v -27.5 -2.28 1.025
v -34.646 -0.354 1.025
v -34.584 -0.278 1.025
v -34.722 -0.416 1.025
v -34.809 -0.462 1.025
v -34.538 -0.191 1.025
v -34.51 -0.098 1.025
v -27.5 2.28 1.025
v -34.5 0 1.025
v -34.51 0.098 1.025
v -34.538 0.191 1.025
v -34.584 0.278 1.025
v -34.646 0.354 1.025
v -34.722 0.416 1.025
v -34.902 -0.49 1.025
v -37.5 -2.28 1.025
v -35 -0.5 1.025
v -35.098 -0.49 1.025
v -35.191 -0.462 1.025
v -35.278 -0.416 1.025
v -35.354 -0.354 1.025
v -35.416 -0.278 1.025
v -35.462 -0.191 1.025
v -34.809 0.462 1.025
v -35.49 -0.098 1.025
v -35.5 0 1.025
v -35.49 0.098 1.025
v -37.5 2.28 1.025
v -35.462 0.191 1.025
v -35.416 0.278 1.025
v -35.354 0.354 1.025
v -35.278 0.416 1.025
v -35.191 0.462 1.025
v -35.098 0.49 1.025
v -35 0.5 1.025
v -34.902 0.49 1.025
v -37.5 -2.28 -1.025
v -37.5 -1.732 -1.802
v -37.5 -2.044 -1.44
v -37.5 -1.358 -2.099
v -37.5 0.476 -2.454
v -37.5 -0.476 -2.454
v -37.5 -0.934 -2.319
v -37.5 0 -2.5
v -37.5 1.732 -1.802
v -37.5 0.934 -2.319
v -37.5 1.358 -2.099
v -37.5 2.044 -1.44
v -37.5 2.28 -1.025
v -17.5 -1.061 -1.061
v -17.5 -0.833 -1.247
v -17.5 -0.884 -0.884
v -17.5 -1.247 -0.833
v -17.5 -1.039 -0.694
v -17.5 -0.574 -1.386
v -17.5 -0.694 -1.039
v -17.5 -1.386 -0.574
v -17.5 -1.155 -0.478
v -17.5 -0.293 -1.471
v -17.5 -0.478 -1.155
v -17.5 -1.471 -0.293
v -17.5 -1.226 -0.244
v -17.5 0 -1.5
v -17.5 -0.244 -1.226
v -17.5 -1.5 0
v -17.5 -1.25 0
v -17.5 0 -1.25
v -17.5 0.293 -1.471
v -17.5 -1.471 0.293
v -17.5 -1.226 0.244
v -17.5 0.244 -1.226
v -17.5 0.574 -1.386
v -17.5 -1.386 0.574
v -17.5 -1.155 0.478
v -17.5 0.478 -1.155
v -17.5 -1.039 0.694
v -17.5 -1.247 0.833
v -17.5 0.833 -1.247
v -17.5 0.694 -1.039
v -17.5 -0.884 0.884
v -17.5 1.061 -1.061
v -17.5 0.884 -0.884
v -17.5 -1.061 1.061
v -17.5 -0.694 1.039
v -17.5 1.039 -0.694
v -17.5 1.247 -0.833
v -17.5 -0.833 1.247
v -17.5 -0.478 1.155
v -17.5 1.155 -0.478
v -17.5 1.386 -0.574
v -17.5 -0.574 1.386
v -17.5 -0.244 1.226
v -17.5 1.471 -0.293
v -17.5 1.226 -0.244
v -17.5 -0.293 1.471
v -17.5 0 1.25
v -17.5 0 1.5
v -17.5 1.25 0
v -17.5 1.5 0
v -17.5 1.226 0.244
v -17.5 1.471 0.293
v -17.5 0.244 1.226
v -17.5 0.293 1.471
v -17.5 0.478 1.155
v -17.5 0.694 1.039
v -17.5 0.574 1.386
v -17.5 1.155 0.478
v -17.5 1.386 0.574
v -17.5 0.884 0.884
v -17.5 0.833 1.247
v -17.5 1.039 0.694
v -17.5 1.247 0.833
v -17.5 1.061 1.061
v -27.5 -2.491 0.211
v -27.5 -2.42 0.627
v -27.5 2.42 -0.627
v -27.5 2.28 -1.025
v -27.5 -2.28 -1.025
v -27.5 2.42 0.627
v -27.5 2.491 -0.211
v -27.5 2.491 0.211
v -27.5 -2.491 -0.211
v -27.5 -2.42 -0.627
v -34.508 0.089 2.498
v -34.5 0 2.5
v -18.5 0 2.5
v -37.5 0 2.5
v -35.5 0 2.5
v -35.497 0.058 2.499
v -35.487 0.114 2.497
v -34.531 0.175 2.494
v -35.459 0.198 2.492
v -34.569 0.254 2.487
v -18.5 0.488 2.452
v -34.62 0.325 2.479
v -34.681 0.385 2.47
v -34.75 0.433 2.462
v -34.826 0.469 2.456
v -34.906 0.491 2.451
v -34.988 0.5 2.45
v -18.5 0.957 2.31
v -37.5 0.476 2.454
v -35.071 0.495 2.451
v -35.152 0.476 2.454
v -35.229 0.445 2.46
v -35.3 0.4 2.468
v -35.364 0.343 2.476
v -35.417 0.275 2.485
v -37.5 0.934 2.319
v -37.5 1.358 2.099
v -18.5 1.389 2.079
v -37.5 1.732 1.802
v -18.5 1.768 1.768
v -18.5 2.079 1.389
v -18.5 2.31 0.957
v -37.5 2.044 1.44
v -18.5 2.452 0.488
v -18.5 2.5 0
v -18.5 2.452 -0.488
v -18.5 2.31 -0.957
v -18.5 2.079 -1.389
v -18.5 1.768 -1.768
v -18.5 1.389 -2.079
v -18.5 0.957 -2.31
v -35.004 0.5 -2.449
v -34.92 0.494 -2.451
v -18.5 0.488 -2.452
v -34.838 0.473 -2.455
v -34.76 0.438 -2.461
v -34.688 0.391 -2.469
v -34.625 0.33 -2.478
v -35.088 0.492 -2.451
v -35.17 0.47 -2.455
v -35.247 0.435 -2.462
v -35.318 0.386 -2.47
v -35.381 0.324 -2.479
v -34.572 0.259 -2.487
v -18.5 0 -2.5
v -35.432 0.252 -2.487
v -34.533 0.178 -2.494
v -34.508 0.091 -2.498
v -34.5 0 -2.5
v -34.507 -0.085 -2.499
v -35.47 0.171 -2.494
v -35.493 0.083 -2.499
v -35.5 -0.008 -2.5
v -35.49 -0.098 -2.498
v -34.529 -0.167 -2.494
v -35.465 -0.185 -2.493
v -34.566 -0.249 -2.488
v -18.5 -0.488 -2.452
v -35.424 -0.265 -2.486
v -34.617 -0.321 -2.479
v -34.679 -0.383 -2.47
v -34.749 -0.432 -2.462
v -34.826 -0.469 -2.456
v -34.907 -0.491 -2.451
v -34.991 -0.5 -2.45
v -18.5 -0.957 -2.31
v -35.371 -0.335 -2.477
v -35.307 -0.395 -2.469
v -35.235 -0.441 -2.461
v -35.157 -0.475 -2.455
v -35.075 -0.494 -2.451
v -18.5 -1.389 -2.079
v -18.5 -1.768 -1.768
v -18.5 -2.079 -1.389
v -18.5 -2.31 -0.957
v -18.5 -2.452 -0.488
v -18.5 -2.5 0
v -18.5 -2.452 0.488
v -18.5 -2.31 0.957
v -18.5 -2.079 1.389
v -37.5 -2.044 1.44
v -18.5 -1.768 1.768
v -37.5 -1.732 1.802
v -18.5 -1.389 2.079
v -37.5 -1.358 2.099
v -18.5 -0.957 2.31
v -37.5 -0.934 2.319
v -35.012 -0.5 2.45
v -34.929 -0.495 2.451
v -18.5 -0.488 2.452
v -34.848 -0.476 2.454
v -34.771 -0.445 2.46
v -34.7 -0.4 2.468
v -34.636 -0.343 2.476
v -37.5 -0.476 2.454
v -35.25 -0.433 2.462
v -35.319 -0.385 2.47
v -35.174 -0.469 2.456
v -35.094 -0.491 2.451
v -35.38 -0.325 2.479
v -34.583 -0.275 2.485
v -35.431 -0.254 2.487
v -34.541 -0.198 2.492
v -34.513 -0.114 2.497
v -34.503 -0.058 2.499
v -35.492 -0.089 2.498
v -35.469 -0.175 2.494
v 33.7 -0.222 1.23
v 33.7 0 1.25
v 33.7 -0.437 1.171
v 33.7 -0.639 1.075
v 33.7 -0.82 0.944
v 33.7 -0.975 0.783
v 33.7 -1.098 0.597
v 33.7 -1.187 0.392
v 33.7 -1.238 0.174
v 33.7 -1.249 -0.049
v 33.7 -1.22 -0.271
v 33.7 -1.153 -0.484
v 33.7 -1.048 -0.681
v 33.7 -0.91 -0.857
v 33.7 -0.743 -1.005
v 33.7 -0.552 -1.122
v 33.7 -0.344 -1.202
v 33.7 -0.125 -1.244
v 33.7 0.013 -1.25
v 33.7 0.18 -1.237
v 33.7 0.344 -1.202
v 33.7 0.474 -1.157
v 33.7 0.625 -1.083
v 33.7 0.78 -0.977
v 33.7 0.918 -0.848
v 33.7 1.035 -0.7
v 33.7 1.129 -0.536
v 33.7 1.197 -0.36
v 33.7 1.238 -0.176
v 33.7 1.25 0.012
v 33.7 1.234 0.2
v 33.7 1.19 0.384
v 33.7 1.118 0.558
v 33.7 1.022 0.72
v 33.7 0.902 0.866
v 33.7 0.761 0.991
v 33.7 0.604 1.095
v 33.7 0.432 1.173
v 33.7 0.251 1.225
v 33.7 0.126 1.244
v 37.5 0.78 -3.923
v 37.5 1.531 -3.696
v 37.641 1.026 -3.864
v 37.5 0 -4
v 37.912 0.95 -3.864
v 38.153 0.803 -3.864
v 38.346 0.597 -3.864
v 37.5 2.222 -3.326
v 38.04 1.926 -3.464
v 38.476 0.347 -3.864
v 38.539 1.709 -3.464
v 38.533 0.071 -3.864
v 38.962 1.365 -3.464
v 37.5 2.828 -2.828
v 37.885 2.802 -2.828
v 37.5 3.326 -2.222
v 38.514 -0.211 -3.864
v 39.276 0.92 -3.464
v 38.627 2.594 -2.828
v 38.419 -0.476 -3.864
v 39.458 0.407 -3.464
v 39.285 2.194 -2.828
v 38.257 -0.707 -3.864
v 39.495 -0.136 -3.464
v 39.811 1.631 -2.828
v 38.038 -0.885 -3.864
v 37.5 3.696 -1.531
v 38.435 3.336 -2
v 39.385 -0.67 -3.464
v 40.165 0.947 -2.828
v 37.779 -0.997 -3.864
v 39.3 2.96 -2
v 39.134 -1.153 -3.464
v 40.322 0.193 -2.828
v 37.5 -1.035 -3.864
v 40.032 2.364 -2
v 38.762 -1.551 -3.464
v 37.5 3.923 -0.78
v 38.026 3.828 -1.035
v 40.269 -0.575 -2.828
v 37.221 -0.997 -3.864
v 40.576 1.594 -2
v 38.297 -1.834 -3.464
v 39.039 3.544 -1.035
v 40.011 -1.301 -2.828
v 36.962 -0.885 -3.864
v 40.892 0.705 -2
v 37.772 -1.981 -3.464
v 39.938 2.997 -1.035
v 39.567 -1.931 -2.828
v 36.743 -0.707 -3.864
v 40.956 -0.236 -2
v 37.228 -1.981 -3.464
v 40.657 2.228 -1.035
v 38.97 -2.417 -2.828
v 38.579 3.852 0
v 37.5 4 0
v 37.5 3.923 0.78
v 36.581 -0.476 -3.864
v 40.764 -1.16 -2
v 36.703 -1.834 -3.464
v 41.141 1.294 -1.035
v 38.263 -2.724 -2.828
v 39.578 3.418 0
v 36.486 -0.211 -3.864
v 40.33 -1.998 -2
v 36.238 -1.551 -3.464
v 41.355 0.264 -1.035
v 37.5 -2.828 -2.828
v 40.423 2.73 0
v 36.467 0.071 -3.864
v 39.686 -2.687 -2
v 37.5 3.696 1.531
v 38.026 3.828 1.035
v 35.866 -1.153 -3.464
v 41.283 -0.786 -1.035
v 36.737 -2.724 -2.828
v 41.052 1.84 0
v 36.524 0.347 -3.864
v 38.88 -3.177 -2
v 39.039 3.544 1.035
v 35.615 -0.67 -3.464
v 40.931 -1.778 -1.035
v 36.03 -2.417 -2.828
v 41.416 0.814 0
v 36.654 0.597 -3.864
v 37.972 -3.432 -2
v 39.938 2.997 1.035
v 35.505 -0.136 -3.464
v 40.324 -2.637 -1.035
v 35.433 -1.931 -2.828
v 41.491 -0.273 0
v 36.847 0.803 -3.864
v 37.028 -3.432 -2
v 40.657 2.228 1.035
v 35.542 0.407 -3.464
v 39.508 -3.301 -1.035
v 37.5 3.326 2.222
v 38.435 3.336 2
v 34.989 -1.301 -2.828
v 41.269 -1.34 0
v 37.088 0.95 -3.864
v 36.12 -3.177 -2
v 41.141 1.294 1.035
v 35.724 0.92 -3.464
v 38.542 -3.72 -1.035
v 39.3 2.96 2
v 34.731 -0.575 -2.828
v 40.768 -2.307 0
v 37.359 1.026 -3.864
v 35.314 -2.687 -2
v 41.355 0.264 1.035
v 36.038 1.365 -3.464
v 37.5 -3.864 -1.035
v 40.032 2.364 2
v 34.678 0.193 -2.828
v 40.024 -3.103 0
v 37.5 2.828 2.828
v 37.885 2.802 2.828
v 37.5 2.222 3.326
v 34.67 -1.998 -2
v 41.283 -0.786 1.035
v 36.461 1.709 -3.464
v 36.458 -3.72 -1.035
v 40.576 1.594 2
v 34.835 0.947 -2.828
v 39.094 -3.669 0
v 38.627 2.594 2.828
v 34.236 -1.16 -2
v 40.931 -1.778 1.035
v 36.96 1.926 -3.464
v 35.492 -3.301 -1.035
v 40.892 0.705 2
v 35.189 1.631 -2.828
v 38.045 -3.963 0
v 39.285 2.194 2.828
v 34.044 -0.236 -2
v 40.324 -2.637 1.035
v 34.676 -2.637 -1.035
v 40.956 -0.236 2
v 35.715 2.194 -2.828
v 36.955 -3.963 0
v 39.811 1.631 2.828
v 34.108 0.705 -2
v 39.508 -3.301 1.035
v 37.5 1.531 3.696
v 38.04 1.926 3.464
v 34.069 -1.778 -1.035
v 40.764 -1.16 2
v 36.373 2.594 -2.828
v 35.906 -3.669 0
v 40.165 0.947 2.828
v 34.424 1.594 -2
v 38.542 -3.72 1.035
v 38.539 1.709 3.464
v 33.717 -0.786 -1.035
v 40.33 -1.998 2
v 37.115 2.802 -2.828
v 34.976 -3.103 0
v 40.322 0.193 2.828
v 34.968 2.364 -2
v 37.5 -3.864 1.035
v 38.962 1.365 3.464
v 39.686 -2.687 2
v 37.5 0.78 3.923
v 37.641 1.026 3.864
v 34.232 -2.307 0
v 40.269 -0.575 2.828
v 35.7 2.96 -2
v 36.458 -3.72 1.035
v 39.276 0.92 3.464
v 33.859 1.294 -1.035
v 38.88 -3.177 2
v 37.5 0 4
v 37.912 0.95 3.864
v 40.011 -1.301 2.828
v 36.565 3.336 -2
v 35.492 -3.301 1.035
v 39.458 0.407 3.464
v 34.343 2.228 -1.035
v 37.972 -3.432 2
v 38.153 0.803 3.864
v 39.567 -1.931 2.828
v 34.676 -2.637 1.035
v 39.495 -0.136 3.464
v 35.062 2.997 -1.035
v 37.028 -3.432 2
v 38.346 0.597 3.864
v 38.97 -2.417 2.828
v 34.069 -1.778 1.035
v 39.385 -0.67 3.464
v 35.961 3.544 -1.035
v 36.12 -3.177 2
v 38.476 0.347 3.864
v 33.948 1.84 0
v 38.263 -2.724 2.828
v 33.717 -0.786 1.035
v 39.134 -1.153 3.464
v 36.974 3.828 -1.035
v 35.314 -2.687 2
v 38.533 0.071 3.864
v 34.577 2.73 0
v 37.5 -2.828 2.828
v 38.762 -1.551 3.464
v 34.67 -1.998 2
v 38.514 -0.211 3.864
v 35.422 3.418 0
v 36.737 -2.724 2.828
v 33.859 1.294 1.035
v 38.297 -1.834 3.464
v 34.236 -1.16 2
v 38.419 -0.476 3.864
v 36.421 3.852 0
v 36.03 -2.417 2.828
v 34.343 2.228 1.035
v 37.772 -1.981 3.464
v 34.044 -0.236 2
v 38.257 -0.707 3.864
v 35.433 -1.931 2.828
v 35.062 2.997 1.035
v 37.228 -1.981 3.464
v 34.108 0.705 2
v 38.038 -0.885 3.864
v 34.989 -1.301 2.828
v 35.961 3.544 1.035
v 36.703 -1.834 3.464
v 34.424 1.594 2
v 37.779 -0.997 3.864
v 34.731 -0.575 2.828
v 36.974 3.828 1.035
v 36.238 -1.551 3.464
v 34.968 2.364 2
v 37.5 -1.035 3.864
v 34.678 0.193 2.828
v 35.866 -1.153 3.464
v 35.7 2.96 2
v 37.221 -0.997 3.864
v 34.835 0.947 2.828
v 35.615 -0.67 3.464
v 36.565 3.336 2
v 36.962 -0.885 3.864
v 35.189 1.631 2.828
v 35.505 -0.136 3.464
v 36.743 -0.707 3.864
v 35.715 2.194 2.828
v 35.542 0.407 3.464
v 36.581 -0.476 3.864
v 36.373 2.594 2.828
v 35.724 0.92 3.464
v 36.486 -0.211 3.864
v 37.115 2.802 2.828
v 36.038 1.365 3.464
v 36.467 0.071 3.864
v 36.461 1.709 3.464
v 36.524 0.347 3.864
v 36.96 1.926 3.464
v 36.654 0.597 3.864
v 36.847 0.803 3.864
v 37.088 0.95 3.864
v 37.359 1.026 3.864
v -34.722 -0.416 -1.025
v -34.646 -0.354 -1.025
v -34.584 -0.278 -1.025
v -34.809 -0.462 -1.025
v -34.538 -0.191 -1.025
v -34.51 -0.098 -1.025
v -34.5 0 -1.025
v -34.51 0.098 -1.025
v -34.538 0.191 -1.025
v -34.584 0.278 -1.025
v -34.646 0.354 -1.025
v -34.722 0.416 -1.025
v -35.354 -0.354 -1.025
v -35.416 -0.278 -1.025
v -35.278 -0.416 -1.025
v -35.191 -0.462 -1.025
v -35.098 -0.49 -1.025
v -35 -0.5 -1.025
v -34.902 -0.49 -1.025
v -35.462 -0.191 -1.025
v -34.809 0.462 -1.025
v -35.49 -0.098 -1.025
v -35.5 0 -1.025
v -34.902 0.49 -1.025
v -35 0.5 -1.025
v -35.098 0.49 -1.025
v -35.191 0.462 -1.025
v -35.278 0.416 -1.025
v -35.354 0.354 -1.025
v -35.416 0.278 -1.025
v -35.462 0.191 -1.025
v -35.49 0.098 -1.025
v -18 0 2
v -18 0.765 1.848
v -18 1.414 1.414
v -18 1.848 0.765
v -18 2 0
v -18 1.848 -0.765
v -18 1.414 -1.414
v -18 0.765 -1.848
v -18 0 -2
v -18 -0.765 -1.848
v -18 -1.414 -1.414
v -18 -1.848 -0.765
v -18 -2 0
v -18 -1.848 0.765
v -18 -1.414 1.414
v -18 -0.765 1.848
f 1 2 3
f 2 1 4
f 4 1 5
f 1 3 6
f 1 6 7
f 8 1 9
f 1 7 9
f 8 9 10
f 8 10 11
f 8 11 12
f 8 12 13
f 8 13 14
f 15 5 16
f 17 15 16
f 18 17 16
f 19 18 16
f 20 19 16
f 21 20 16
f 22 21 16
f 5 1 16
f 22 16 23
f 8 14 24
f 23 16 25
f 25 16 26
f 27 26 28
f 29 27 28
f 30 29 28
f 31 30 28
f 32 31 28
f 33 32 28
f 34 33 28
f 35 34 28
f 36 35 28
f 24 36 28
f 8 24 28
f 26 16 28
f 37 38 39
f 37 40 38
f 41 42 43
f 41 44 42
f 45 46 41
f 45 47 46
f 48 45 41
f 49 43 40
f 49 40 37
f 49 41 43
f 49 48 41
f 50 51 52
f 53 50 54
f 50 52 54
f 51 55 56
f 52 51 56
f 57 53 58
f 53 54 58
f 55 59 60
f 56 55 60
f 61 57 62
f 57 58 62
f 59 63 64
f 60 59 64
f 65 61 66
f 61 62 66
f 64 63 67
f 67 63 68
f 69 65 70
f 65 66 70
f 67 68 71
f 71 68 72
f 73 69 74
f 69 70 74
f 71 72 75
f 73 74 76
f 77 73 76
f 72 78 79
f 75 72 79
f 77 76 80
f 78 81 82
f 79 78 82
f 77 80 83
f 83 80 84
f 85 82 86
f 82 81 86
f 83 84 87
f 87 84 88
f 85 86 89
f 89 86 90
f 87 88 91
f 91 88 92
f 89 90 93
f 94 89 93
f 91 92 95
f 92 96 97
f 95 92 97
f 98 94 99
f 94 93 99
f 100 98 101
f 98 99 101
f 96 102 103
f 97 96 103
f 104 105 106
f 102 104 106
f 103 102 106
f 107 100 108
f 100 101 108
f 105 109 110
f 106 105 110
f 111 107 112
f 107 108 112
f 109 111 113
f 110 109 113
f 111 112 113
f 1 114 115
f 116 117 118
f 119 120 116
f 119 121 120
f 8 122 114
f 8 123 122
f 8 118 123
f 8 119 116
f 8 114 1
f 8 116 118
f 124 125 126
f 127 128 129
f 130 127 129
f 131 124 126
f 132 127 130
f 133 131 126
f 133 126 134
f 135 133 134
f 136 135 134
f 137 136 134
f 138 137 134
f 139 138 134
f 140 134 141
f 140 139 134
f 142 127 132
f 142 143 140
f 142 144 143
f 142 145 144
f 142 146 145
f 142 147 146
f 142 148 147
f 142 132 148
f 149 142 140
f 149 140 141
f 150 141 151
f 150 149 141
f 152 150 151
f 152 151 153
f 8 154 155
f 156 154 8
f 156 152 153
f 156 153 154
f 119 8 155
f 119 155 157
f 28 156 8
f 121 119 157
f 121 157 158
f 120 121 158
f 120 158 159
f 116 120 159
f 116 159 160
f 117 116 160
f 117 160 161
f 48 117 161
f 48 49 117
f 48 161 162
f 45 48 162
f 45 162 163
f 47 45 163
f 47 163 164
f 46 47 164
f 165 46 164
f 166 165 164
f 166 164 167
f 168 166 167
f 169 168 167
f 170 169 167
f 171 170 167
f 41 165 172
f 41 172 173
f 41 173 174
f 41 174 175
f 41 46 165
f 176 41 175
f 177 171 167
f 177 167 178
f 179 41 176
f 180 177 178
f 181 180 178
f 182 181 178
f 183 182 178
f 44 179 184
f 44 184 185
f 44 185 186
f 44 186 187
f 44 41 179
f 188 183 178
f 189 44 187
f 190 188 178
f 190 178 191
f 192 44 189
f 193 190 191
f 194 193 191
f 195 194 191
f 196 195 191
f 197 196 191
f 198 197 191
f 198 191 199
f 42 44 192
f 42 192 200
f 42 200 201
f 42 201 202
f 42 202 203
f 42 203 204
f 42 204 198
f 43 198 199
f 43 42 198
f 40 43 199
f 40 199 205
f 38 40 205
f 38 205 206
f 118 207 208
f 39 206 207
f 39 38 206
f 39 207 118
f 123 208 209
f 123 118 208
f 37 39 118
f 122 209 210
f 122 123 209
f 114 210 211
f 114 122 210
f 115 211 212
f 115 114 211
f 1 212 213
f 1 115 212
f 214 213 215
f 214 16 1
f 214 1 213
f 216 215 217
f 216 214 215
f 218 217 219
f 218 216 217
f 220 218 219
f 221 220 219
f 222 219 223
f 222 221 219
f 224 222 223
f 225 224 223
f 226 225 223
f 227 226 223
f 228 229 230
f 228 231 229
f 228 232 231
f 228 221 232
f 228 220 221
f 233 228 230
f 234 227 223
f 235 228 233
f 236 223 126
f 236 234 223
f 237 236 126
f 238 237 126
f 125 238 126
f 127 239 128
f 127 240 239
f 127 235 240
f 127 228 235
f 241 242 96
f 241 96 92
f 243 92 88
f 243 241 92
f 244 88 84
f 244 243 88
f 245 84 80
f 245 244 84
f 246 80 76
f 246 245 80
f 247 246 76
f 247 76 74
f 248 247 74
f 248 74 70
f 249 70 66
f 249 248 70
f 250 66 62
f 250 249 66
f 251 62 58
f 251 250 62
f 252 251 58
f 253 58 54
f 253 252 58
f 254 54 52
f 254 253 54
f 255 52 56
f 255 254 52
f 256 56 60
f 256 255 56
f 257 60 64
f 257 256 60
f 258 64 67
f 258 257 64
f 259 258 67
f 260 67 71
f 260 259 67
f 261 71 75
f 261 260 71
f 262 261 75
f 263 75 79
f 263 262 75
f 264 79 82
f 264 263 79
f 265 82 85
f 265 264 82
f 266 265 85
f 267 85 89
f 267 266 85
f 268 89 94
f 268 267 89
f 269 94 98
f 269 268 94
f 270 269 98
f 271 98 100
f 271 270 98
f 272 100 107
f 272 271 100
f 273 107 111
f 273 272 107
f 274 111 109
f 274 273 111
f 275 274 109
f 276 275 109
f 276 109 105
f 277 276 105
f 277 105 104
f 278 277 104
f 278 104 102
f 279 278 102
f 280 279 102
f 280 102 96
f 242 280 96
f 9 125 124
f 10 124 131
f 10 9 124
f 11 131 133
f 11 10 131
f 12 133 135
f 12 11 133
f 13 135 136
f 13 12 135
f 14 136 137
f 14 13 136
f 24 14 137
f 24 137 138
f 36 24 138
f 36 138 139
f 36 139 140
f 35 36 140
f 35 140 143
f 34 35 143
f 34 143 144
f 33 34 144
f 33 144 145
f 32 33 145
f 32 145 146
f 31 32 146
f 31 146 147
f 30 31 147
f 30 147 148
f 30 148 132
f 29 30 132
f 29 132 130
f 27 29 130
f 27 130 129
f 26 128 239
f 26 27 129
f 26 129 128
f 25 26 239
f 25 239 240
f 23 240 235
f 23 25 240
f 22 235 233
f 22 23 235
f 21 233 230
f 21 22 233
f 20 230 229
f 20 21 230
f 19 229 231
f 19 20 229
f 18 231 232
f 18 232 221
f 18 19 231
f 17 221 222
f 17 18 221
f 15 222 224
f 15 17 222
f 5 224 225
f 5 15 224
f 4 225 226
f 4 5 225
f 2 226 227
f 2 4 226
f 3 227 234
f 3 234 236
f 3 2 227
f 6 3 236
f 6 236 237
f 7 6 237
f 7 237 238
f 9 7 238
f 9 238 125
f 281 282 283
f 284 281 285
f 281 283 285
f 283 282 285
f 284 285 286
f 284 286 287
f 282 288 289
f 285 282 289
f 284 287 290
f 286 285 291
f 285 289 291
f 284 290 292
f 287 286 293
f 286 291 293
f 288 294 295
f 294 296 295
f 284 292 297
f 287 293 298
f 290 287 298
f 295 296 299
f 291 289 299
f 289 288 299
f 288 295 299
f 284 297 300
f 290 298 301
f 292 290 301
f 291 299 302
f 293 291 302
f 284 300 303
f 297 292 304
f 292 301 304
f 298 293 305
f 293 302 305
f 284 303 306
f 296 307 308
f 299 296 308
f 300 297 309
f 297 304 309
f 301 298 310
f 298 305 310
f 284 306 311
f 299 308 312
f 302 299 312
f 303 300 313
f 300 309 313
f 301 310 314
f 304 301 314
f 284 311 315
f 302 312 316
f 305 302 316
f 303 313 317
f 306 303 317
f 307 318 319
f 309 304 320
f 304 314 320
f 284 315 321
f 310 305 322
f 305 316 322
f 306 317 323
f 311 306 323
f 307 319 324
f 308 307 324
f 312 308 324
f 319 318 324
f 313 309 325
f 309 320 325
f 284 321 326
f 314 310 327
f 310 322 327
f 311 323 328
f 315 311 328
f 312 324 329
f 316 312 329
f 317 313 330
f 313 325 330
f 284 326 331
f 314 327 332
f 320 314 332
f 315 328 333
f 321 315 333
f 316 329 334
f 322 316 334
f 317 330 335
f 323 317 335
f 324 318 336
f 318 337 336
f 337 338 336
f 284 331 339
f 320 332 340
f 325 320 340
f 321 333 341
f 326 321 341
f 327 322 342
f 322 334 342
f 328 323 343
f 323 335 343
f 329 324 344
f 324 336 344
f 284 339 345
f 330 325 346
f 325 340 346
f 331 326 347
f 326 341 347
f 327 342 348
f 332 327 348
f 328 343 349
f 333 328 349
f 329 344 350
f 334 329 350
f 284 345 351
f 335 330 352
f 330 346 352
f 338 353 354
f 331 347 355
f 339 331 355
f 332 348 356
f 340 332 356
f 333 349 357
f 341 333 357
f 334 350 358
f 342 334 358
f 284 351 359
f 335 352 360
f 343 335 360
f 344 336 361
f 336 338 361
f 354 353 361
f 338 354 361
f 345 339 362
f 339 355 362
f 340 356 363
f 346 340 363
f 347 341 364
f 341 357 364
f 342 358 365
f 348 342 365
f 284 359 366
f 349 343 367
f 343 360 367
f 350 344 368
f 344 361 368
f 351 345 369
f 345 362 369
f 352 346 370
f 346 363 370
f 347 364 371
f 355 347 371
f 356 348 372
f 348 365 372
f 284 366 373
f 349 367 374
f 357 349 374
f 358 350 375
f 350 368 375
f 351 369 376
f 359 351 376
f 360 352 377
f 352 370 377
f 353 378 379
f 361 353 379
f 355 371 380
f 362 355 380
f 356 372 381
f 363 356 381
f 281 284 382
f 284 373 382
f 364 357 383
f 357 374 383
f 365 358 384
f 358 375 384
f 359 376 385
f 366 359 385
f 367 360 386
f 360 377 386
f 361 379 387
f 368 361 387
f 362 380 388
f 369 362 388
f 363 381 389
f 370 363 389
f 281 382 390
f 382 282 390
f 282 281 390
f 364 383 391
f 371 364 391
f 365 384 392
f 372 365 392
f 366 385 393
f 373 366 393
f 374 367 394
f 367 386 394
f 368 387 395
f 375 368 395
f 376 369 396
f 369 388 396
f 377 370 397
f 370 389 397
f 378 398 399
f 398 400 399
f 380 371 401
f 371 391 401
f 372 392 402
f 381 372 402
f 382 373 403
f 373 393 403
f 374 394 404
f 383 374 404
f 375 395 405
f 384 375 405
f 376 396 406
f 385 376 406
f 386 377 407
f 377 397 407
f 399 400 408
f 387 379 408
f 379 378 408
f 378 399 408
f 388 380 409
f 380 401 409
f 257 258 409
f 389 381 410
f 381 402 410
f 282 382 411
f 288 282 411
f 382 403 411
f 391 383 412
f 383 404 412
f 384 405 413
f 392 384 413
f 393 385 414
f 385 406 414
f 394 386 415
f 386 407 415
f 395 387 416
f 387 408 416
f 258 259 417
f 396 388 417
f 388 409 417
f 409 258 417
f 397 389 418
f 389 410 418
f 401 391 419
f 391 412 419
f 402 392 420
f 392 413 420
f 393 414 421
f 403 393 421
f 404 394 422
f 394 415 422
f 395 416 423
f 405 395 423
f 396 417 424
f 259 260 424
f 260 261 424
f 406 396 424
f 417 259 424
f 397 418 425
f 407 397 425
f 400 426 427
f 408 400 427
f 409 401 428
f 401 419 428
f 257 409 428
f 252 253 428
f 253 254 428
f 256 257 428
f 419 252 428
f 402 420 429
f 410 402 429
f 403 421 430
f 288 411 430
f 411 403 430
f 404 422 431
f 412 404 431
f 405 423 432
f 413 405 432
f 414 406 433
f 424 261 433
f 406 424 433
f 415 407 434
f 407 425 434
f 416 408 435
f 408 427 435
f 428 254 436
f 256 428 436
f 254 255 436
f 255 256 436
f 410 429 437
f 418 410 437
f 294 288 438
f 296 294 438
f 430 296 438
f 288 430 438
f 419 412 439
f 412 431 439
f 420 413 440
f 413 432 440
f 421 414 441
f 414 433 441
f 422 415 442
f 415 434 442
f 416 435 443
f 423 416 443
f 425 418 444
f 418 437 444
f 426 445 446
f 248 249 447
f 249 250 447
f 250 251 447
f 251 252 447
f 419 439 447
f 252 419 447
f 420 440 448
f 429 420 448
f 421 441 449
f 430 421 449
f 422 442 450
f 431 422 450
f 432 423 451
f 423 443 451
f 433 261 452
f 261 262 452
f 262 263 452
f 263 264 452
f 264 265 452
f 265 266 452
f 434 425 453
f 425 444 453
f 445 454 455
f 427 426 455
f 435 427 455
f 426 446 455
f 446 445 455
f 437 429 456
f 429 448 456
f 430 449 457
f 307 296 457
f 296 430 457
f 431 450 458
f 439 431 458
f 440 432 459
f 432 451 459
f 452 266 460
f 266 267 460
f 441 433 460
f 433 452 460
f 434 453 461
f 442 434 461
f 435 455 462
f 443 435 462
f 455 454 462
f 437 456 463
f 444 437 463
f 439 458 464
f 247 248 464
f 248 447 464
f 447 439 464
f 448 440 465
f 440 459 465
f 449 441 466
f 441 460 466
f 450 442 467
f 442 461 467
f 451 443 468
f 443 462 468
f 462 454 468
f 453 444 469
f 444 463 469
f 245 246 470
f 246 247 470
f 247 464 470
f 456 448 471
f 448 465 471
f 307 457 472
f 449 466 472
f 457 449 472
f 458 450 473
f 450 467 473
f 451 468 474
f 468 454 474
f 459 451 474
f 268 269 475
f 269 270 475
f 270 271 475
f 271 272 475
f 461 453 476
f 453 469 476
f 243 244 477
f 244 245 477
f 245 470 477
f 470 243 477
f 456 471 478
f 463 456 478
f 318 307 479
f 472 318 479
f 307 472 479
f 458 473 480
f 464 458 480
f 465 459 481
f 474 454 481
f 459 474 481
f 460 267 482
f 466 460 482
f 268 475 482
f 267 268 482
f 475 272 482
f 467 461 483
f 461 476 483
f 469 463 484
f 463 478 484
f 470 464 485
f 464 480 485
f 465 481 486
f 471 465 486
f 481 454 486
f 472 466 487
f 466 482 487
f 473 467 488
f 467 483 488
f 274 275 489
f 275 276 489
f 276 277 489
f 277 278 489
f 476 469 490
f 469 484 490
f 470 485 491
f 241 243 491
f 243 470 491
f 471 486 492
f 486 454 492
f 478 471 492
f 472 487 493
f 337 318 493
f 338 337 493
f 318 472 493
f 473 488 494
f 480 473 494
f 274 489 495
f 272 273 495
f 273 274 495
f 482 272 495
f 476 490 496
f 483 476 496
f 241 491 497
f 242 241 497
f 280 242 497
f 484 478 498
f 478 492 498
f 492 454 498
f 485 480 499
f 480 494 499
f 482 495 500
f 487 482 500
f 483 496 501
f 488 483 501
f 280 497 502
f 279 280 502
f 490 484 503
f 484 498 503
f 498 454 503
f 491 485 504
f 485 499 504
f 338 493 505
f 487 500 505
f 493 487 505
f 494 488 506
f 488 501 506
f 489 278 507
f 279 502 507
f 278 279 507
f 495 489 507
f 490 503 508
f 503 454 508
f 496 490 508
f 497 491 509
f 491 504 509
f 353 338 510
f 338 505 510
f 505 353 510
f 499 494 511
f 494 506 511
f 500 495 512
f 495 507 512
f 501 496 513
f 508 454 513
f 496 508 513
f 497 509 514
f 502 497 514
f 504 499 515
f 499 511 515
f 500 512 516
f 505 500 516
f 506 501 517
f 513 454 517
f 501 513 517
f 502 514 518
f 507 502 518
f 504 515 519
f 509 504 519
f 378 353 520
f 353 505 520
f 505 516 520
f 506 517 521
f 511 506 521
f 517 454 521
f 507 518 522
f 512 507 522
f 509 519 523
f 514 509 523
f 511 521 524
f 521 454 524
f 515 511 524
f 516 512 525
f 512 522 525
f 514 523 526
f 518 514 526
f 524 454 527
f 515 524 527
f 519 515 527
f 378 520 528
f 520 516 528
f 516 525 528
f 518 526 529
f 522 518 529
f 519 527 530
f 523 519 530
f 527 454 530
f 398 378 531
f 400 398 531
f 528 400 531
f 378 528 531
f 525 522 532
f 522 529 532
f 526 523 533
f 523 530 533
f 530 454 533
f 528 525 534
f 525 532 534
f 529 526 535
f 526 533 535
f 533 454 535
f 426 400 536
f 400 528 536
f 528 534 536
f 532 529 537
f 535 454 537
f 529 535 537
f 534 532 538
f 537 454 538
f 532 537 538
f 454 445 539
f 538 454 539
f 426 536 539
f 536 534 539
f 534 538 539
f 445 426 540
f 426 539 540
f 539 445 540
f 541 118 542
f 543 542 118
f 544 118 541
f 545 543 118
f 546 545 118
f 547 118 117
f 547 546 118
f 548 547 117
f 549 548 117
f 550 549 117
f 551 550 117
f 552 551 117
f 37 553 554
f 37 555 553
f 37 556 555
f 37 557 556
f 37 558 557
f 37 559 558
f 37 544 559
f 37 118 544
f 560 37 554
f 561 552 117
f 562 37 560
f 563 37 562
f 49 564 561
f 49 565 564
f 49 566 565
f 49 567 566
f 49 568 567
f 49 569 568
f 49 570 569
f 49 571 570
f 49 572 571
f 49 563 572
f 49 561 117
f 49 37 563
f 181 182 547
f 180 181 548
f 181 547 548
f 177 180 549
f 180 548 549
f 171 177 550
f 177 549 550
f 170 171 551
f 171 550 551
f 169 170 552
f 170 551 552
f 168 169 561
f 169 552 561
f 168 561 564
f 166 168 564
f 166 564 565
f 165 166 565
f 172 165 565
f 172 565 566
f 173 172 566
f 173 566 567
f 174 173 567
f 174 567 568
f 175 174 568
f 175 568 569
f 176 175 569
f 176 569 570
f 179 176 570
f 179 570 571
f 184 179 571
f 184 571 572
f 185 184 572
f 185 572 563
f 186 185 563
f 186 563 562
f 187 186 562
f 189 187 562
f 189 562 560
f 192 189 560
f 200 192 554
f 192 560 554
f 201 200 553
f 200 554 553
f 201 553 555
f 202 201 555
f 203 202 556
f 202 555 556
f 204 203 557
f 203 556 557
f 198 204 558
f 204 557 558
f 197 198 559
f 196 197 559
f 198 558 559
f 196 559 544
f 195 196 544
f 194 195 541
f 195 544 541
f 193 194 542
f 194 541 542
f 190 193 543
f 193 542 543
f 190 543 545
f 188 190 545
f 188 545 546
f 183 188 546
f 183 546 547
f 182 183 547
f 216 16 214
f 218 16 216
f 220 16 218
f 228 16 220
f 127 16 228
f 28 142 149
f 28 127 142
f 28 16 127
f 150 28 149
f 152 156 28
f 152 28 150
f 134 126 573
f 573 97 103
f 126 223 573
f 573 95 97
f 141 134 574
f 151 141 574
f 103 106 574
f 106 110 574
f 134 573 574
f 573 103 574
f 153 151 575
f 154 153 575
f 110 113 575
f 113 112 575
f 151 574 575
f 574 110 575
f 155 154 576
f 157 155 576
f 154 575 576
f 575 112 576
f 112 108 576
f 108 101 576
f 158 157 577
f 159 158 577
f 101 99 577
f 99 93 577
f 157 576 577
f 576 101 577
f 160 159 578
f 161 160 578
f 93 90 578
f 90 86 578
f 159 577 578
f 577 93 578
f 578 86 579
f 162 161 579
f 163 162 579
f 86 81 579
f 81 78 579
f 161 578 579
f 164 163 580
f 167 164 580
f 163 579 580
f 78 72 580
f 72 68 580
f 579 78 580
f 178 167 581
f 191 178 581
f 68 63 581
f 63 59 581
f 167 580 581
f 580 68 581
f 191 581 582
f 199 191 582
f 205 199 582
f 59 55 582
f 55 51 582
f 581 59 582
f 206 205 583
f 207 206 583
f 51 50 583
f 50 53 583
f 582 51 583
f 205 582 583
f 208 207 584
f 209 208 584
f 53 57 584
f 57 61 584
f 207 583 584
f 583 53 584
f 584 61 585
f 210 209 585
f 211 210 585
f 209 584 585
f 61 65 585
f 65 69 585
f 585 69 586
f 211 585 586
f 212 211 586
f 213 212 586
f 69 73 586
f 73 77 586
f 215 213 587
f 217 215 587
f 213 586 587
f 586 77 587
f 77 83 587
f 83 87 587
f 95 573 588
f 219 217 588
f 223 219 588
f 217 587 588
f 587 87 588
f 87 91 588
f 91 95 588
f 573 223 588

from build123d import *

# Parameters (mm, degrees)
SKETCH1_W               = 75
SKETCH1_H               = 1.25
SKETCH2_R               = 2.5
BOSS_EXTRUDE1_DEPTH     = 20
SKETCH3_W               = 2.05
SKETCH3_H               = 5
CUT_EXTRUDE1_DEPTH      = 1
CUT_EXTRUDE1_DEPTH_BACK = 10
CHAMFER1_SIZE           = 1
SKETCH4_R               = 0.5
CUT_EXTRUDE2_DEPTH      = 4.525
CUT_EXTRUDE2_DEPTH_BACK = 2.475


with BuildPart() as part:
    # Sketch1 → Revolve2 (revolve)
    with BuildSketch(Plane(origin=(0, 0, 0), x_dir=(1, 0, 0), z_dir=(0, 1, 0))):
        with Locations((0, -0.625)):
            Rectangle(SKETCH1_W, SKETCH1_H)
    revolve(axis=Axis((-37.5, 0, 0), (1, 0, 0)))

    # Sketch2 → Boss-Extrude1 (add)
    with BuildSketch(Plane.ZY.offset(37.5)):
        Circle(SKETCH2_R)
    extrude(amount=-BOSS_EXTRUDE1_DEPTH)

    # Sketch3 → Cut-Extrude1 (cut, two sides)
    with BuildSketch(Plane.ZY.offset(37.5)) as cut_extrude1_sk:
        Rectangle(SKETCH3_W, SKETCH3_H)
    extrude(amount=CUT_EXTRUDE1_DEPTH, mode=Mode.SUBTRACT)
    extrude(cut_extrude1_sk.sketch, amount=-CUT_EXTRUDE1_DEPTH_BACK, mode=Mode.SUBTRACT)

    # Chamfer1
    chamfer1_edges = [part.edges().sort_by_distance(p)[0] for p in [
        (-17.5, 0, -2.5),
    ]]
    chamfer(chamfer1_edges, length=CHAMFER1_SIZE)

    # Sketch4 → Cut-Extrude2 (cut, two sides)
    with BuildSketch(Plane.XY.offset(-1.025)) as cut_extrude2_sk:
        with Locations((-35, 0)):
            Circle(SKETCH4_R)
    extrude(amount=CUT_EXTRUDE2_DEPTH, mode=Mode.SUBTRACT)
    extrude(cut_extrude2_sk.sketch, amount=-CUT_EXTRUDE2_DEPTH_BACK, mode=Mode.SUBTRACT)

    # Sketch5 one side → Revolve3 (revolve)
    with BuildSketch(Plane(origin=(37.5, 0, 0), x_dir=(0, 0, -1), z_dir=(1, 0, 0))):
        with BuildLine():
            ThreePointArc((1.25, 0), (0, 1.25), (-1.25, 0))
            Line((-1.25, 0), (1.25, 0))
        make_face()
        with BuildLine():
            Line((-4, 0), (-1.25, 0))
            ThreePointArc((-1.25, 0), (0, 1.25), (1.25, 0))
            Line((1.25, 0), (4, 0))
            ThreePointArc((4, 0), (0, 4), (-4, 0))
        make_face()
    revolve(axis=Axis((37.5, 0, 4), (0, 0, -1)))


solid = part.part
